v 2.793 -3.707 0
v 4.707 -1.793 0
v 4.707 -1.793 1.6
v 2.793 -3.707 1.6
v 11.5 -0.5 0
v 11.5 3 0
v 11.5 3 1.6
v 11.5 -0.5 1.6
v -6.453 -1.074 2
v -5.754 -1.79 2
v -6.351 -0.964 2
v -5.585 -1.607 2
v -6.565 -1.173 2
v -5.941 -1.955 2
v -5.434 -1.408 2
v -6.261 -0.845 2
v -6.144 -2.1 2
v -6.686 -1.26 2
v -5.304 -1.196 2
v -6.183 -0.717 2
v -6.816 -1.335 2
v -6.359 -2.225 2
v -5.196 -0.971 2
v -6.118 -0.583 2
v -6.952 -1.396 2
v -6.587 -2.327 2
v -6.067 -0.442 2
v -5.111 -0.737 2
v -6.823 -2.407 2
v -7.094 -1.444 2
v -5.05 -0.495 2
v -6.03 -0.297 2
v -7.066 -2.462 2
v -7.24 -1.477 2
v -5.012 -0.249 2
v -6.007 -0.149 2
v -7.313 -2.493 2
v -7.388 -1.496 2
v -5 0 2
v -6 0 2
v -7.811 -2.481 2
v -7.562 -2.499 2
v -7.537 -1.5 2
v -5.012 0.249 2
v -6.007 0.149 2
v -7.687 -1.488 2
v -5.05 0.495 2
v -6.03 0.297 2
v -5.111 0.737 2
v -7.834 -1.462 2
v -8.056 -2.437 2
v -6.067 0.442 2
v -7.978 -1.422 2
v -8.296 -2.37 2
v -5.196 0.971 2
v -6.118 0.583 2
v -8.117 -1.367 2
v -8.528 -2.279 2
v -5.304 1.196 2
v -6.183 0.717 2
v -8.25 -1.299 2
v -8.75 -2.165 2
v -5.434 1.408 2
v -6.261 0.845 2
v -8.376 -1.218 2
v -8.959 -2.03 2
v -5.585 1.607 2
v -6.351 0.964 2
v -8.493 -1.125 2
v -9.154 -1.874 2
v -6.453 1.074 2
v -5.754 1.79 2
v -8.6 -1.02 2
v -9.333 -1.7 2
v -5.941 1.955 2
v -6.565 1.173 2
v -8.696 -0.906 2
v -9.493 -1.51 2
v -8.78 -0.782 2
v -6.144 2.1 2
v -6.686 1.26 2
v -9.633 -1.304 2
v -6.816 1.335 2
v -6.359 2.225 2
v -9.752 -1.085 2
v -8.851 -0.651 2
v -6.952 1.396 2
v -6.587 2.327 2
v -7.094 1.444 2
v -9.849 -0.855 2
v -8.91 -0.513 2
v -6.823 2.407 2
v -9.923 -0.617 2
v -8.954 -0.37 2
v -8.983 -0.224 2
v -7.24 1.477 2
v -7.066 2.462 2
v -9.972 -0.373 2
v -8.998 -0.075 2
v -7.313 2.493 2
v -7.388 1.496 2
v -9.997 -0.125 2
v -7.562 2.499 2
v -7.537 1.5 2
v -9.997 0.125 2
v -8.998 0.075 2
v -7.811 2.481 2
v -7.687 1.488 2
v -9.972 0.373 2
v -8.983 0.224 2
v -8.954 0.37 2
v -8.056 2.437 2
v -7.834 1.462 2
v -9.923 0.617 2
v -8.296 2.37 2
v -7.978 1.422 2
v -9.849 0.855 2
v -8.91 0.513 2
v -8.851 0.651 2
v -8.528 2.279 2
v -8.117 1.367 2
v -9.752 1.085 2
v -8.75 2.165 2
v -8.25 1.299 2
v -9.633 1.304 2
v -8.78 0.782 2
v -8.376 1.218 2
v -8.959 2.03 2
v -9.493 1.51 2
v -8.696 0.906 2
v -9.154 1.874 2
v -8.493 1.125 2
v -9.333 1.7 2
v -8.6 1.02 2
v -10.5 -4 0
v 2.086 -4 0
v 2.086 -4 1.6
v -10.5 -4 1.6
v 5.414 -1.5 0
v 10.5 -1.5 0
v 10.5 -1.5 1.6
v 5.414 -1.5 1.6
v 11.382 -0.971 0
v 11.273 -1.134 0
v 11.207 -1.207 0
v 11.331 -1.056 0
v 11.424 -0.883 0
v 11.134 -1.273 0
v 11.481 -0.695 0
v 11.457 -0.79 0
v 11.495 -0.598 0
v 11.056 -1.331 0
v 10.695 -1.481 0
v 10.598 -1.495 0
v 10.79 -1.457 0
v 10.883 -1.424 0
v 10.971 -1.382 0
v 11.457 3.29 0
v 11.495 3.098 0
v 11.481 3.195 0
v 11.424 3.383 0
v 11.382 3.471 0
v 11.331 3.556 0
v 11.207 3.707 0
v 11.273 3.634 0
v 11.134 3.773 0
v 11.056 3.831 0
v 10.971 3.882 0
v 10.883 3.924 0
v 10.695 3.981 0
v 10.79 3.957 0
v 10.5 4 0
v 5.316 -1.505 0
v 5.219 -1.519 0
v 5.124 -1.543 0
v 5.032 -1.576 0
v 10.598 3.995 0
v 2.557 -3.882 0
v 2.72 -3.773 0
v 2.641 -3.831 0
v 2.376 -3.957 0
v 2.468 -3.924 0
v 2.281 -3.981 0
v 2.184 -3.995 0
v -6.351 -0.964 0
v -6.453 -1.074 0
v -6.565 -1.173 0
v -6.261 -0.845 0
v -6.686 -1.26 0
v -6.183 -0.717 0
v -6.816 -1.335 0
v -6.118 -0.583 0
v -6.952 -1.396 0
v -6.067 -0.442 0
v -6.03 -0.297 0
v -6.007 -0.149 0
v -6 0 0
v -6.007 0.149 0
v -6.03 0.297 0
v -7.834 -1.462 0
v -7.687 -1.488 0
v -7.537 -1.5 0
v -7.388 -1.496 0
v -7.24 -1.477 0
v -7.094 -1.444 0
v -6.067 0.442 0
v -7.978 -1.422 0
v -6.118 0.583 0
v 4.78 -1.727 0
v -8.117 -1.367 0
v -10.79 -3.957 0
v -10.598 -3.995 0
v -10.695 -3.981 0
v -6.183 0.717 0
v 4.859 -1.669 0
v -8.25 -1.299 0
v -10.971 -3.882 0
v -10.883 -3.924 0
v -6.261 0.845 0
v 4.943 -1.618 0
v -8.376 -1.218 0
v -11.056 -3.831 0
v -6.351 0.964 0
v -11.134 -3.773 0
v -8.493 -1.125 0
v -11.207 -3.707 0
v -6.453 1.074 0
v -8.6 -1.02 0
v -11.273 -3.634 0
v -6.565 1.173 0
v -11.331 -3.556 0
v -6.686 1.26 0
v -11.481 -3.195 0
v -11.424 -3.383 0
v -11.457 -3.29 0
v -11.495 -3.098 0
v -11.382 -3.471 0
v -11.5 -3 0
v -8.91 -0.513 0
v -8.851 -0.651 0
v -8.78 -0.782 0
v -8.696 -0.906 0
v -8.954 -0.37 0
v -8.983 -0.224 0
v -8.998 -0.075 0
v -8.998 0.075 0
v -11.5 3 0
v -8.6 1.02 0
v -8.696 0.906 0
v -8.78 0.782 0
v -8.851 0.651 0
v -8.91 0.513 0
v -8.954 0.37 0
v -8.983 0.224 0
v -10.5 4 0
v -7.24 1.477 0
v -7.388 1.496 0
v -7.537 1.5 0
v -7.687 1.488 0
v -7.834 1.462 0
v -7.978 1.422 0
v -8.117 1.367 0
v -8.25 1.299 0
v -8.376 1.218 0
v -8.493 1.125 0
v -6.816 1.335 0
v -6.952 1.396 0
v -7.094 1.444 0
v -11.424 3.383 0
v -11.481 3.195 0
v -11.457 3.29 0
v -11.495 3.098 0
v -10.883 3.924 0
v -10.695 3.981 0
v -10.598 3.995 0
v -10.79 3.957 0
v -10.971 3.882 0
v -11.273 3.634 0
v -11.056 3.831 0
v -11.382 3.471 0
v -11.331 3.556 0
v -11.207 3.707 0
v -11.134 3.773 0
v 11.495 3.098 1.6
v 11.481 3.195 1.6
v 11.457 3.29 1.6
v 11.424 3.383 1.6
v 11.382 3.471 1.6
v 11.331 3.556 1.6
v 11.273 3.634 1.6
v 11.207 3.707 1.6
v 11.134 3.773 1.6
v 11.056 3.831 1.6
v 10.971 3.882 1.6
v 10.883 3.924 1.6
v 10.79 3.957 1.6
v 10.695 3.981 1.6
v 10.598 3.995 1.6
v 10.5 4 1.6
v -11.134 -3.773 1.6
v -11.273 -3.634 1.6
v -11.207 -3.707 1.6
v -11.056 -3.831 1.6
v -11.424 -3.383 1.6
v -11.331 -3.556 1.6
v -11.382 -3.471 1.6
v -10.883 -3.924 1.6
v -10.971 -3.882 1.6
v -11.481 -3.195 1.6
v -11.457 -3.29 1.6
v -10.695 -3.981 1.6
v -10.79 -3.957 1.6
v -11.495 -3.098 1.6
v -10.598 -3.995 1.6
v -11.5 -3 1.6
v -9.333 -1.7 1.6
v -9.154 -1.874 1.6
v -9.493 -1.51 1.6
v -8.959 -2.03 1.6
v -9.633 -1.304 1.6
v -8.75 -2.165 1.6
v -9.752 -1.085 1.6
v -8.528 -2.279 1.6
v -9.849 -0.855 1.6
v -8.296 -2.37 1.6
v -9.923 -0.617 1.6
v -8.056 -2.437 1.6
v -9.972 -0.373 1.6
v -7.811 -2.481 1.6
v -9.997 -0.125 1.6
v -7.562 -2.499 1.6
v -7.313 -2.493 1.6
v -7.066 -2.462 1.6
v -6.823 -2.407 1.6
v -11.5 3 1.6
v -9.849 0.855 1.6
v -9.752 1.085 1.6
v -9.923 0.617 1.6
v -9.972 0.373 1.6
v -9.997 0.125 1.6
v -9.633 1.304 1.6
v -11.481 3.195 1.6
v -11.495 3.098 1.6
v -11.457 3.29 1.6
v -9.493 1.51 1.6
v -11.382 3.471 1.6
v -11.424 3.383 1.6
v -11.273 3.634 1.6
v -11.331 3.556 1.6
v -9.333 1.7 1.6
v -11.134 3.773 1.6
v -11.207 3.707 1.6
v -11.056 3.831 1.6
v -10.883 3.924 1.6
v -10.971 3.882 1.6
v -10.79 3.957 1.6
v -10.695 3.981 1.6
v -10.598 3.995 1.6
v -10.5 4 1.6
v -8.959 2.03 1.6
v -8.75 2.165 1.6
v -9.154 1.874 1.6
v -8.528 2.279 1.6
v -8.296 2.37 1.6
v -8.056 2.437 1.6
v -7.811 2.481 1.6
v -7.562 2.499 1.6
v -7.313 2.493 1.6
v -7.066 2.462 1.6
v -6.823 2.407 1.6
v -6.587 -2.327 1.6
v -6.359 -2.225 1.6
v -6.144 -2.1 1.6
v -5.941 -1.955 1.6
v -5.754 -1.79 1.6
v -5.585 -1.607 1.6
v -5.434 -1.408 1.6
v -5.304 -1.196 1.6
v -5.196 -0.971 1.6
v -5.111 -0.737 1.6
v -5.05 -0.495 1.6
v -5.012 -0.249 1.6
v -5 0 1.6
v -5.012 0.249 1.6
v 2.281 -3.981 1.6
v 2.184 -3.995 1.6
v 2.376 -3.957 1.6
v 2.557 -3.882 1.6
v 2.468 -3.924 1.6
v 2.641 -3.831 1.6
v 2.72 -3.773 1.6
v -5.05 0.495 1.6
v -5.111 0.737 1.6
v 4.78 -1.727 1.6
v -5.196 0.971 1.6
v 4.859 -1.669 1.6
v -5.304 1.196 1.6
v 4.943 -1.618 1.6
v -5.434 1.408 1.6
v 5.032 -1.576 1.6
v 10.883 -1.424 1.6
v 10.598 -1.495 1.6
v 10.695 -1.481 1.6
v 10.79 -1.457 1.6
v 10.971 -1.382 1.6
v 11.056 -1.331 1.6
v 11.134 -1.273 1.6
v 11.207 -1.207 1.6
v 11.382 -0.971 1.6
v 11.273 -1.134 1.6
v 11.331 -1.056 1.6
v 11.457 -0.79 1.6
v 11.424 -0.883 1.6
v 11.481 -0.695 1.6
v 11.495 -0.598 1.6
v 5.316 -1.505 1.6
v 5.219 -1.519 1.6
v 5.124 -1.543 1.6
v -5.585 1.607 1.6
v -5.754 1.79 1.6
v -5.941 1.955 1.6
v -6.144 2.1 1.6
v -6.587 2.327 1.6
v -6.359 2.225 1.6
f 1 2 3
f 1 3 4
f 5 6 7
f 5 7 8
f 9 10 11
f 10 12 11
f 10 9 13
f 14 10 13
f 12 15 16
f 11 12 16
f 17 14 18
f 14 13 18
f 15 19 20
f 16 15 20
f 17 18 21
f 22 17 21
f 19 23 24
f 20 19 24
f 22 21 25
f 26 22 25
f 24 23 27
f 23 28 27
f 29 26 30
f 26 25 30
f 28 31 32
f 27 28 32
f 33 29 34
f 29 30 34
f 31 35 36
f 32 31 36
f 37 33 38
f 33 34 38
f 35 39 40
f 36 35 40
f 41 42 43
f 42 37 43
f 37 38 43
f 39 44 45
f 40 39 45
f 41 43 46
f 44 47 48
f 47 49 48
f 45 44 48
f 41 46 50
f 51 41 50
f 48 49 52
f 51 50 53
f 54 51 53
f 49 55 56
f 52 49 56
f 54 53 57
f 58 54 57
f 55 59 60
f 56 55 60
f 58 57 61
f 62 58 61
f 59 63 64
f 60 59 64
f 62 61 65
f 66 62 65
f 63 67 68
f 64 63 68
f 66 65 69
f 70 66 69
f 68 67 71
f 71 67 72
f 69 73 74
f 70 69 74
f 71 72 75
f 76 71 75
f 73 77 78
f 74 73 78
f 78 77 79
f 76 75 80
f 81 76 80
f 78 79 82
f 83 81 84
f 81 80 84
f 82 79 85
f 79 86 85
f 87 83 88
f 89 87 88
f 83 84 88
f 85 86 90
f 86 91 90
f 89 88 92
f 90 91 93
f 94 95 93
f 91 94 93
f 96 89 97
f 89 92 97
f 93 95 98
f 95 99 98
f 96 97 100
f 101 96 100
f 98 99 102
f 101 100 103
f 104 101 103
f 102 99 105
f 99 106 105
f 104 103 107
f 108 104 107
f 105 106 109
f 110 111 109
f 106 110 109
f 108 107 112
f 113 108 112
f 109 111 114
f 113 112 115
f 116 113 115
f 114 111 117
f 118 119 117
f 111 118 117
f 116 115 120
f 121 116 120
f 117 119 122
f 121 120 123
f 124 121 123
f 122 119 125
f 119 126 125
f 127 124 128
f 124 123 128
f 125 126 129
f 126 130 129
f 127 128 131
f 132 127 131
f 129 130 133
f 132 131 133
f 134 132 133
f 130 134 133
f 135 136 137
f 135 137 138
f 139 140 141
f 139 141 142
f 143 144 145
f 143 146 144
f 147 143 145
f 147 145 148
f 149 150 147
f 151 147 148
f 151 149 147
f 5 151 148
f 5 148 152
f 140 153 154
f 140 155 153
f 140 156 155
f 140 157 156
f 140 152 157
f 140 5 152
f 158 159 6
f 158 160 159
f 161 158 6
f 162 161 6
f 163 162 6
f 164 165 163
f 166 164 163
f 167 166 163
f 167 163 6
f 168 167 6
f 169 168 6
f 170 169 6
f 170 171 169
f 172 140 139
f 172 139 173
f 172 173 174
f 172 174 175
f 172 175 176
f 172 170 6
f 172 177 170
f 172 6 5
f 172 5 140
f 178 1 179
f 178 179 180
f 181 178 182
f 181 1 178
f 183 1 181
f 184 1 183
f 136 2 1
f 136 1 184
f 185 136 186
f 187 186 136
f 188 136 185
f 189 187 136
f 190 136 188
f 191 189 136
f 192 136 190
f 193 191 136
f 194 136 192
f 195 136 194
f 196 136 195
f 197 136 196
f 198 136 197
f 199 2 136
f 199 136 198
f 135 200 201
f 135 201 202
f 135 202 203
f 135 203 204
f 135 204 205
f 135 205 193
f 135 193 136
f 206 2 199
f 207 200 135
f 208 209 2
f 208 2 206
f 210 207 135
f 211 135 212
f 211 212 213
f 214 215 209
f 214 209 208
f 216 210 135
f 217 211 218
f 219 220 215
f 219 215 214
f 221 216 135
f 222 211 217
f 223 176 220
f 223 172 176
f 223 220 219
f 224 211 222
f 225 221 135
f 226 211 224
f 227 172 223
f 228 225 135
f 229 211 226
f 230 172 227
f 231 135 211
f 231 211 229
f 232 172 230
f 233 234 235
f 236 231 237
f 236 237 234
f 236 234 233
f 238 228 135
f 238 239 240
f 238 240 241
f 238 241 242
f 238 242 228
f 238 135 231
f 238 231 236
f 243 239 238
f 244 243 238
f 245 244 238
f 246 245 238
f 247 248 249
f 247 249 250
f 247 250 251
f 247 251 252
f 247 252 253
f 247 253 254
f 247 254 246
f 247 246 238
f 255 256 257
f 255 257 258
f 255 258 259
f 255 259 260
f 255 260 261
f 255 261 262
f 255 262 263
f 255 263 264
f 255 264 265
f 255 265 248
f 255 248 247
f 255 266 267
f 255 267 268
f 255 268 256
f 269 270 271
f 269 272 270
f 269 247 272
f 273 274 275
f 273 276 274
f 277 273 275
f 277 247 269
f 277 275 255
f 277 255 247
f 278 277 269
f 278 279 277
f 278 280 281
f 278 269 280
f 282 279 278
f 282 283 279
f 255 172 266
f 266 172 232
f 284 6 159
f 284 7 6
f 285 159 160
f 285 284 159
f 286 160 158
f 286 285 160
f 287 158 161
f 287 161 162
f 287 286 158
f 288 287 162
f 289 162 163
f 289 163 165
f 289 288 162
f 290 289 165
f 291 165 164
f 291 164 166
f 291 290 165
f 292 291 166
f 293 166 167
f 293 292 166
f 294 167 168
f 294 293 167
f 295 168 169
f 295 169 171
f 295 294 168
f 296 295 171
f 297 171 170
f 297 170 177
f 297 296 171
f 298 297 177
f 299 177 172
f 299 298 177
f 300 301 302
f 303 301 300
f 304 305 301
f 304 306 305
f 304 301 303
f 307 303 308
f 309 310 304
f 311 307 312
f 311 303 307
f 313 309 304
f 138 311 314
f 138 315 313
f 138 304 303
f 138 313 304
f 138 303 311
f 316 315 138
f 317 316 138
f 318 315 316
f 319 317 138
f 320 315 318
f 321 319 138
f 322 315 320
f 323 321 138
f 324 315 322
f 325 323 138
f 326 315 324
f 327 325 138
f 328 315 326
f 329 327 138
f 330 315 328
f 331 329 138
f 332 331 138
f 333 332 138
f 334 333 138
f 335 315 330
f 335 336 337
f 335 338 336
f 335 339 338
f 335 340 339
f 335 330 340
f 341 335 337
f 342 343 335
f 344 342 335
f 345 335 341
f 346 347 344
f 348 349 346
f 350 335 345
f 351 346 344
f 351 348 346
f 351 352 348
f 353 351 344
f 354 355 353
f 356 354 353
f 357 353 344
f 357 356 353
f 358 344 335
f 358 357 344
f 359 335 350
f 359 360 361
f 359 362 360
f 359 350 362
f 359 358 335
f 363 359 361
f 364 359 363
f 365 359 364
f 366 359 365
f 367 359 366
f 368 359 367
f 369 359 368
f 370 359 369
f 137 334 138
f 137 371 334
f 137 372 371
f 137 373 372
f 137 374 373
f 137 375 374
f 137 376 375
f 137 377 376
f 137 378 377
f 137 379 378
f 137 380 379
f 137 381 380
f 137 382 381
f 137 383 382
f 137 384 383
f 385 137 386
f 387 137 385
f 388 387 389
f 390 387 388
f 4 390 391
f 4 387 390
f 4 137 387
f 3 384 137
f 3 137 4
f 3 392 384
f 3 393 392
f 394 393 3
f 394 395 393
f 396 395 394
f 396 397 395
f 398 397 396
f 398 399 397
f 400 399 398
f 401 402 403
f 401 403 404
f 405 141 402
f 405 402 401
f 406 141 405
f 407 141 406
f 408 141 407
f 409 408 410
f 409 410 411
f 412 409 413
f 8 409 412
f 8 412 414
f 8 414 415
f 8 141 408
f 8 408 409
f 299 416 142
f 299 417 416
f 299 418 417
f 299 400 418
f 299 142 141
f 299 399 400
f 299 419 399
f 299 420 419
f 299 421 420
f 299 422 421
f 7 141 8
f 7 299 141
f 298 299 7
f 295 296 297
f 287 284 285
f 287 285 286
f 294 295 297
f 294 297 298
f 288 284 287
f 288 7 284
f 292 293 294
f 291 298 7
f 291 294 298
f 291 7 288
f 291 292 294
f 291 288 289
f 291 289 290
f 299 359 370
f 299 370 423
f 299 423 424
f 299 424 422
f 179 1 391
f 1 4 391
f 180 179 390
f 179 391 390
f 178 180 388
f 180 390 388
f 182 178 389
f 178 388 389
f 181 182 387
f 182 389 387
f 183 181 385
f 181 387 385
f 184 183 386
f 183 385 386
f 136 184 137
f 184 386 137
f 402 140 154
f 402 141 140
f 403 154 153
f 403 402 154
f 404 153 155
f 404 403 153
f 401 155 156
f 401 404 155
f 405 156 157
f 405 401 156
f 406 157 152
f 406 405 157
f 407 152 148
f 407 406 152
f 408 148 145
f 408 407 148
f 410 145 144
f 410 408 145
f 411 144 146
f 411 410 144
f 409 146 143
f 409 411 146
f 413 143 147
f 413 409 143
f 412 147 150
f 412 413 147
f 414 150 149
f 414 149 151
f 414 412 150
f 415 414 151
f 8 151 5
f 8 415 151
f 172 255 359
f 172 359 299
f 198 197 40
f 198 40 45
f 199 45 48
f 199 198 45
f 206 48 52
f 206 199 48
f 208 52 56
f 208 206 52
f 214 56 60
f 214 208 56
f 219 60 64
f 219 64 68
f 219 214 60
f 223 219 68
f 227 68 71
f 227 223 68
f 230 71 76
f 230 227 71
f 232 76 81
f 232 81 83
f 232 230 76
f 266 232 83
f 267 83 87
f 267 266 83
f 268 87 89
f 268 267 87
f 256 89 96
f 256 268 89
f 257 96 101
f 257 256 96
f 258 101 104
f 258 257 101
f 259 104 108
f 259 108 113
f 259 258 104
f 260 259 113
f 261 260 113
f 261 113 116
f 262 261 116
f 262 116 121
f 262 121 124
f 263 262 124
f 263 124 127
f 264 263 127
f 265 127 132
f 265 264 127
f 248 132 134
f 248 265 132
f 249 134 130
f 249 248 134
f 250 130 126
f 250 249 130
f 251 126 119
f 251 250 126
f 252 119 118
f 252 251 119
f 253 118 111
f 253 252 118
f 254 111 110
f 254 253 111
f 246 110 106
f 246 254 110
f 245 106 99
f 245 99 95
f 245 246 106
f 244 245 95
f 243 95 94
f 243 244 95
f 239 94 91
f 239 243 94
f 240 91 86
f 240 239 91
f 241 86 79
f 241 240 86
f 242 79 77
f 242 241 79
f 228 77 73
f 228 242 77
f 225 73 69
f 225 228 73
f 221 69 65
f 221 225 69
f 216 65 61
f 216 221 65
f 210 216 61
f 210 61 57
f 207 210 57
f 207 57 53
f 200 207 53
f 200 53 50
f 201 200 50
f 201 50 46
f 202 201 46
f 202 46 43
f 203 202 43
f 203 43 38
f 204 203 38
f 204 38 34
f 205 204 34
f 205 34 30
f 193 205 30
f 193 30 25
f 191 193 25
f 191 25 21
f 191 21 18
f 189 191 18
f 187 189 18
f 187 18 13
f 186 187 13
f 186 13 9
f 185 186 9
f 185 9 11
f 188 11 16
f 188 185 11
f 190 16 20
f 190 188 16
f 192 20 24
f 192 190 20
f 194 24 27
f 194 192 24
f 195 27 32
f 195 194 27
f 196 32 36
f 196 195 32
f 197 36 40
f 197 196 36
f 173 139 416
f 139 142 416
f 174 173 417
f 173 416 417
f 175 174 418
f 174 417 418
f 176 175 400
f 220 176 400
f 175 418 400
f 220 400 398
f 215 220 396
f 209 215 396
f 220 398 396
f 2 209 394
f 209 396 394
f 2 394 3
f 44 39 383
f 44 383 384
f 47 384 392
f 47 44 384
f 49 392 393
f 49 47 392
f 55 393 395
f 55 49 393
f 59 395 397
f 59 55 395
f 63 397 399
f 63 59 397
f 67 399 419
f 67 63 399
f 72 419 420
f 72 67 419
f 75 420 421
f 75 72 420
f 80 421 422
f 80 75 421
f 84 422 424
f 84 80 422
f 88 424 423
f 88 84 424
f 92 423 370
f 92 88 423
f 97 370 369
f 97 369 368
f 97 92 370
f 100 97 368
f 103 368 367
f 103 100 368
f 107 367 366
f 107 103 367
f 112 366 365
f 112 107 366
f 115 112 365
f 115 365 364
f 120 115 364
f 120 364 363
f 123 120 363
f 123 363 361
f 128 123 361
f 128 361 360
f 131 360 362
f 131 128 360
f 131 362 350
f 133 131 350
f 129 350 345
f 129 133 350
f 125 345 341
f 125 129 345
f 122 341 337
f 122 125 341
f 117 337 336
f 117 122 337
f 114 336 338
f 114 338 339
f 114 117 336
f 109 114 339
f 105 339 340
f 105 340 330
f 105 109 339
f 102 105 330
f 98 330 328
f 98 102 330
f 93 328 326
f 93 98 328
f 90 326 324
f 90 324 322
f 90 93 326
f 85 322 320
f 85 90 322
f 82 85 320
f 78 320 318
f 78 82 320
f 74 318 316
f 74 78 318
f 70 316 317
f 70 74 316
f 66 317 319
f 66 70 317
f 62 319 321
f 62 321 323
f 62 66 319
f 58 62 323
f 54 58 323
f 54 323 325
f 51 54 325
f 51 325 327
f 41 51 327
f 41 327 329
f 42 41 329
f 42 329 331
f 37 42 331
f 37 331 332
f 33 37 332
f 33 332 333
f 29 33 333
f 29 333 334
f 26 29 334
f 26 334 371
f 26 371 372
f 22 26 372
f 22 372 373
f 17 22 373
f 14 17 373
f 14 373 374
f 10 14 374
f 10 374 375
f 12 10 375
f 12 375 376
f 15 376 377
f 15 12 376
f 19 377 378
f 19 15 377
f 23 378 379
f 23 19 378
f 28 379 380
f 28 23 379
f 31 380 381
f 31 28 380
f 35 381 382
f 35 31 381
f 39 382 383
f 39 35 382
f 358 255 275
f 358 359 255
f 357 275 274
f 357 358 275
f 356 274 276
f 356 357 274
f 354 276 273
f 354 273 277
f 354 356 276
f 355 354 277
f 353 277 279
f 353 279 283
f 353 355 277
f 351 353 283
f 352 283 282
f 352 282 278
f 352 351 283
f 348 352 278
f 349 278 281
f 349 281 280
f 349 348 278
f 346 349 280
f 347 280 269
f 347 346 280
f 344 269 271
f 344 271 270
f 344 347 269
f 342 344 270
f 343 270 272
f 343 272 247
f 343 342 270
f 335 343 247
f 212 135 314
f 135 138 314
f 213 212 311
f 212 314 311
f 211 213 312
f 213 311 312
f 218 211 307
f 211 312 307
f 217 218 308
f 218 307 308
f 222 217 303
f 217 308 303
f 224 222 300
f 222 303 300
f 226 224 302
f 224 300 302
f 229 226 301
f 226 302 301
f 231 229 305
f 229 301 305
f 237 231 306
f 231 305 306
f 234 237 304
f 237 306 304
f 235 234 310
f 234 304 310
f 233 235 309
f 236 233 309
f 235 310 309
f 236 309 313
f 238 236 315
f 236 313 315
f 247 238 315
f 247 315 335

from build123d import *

# Parameters (mm, degrees)
SKETCH1_R           = 1.5
BOSS_EXTRUDE1_DEPTH = 2
SKETCH2_R           = 2.5
CUT_EXTRUDE1_DEPTH  = 0.4
FILLET1_R           = 1


with BuildPart() as part:
    # Sketch1 → Boss-Extrude1 (new body)
    with BuildSketch(Plane.XY):
        Polygon((11.5, -1.5), (5, -1.5), (2.5, -4), (-11.5, -4), (-11.5, 4), (11.5, 4), align=None)
        with Locations((-7.5, 0)):
            Circle(SKETCH1_R, mode=Mode.SUBTRACT)
    extrude(amount=BOSS_EXTRUDE1_DEPTH)

    # Sketch2 → Cut-Extrude1 (cut)
    with BuildSketch(Plane.XY.offset(2)):
        Polygon((-11.5, 4), (-11.5, -4), (2.5, -4), (5, -1.5), (11.5, -1.5), (11.5, 4), align=None)
        with Locations((-7.5, 0)):
            Circle(SKETCH2_R, mode=Mode.SUBTRACT)
    extrude(amount=-CUT_EXTRUDE1_DEPTH, mode=Mode.SUBTRACT)

    # Fillet1
    fillet1_edges = [part.edges().sort_by_distance(p)[0] for p in [
        (-11.5, 4, 0.8),
        (11.5, 4, 0.8),
        (11.5, -1.5, 0.8),
        (5, -1.5, 0.8),
        (2.5, -4, 0.8),
        (-11.5, -4, 0.8),
    ]]
    fillet(fillet1_edges, radius=FILLET1_R)


solid = part.part
